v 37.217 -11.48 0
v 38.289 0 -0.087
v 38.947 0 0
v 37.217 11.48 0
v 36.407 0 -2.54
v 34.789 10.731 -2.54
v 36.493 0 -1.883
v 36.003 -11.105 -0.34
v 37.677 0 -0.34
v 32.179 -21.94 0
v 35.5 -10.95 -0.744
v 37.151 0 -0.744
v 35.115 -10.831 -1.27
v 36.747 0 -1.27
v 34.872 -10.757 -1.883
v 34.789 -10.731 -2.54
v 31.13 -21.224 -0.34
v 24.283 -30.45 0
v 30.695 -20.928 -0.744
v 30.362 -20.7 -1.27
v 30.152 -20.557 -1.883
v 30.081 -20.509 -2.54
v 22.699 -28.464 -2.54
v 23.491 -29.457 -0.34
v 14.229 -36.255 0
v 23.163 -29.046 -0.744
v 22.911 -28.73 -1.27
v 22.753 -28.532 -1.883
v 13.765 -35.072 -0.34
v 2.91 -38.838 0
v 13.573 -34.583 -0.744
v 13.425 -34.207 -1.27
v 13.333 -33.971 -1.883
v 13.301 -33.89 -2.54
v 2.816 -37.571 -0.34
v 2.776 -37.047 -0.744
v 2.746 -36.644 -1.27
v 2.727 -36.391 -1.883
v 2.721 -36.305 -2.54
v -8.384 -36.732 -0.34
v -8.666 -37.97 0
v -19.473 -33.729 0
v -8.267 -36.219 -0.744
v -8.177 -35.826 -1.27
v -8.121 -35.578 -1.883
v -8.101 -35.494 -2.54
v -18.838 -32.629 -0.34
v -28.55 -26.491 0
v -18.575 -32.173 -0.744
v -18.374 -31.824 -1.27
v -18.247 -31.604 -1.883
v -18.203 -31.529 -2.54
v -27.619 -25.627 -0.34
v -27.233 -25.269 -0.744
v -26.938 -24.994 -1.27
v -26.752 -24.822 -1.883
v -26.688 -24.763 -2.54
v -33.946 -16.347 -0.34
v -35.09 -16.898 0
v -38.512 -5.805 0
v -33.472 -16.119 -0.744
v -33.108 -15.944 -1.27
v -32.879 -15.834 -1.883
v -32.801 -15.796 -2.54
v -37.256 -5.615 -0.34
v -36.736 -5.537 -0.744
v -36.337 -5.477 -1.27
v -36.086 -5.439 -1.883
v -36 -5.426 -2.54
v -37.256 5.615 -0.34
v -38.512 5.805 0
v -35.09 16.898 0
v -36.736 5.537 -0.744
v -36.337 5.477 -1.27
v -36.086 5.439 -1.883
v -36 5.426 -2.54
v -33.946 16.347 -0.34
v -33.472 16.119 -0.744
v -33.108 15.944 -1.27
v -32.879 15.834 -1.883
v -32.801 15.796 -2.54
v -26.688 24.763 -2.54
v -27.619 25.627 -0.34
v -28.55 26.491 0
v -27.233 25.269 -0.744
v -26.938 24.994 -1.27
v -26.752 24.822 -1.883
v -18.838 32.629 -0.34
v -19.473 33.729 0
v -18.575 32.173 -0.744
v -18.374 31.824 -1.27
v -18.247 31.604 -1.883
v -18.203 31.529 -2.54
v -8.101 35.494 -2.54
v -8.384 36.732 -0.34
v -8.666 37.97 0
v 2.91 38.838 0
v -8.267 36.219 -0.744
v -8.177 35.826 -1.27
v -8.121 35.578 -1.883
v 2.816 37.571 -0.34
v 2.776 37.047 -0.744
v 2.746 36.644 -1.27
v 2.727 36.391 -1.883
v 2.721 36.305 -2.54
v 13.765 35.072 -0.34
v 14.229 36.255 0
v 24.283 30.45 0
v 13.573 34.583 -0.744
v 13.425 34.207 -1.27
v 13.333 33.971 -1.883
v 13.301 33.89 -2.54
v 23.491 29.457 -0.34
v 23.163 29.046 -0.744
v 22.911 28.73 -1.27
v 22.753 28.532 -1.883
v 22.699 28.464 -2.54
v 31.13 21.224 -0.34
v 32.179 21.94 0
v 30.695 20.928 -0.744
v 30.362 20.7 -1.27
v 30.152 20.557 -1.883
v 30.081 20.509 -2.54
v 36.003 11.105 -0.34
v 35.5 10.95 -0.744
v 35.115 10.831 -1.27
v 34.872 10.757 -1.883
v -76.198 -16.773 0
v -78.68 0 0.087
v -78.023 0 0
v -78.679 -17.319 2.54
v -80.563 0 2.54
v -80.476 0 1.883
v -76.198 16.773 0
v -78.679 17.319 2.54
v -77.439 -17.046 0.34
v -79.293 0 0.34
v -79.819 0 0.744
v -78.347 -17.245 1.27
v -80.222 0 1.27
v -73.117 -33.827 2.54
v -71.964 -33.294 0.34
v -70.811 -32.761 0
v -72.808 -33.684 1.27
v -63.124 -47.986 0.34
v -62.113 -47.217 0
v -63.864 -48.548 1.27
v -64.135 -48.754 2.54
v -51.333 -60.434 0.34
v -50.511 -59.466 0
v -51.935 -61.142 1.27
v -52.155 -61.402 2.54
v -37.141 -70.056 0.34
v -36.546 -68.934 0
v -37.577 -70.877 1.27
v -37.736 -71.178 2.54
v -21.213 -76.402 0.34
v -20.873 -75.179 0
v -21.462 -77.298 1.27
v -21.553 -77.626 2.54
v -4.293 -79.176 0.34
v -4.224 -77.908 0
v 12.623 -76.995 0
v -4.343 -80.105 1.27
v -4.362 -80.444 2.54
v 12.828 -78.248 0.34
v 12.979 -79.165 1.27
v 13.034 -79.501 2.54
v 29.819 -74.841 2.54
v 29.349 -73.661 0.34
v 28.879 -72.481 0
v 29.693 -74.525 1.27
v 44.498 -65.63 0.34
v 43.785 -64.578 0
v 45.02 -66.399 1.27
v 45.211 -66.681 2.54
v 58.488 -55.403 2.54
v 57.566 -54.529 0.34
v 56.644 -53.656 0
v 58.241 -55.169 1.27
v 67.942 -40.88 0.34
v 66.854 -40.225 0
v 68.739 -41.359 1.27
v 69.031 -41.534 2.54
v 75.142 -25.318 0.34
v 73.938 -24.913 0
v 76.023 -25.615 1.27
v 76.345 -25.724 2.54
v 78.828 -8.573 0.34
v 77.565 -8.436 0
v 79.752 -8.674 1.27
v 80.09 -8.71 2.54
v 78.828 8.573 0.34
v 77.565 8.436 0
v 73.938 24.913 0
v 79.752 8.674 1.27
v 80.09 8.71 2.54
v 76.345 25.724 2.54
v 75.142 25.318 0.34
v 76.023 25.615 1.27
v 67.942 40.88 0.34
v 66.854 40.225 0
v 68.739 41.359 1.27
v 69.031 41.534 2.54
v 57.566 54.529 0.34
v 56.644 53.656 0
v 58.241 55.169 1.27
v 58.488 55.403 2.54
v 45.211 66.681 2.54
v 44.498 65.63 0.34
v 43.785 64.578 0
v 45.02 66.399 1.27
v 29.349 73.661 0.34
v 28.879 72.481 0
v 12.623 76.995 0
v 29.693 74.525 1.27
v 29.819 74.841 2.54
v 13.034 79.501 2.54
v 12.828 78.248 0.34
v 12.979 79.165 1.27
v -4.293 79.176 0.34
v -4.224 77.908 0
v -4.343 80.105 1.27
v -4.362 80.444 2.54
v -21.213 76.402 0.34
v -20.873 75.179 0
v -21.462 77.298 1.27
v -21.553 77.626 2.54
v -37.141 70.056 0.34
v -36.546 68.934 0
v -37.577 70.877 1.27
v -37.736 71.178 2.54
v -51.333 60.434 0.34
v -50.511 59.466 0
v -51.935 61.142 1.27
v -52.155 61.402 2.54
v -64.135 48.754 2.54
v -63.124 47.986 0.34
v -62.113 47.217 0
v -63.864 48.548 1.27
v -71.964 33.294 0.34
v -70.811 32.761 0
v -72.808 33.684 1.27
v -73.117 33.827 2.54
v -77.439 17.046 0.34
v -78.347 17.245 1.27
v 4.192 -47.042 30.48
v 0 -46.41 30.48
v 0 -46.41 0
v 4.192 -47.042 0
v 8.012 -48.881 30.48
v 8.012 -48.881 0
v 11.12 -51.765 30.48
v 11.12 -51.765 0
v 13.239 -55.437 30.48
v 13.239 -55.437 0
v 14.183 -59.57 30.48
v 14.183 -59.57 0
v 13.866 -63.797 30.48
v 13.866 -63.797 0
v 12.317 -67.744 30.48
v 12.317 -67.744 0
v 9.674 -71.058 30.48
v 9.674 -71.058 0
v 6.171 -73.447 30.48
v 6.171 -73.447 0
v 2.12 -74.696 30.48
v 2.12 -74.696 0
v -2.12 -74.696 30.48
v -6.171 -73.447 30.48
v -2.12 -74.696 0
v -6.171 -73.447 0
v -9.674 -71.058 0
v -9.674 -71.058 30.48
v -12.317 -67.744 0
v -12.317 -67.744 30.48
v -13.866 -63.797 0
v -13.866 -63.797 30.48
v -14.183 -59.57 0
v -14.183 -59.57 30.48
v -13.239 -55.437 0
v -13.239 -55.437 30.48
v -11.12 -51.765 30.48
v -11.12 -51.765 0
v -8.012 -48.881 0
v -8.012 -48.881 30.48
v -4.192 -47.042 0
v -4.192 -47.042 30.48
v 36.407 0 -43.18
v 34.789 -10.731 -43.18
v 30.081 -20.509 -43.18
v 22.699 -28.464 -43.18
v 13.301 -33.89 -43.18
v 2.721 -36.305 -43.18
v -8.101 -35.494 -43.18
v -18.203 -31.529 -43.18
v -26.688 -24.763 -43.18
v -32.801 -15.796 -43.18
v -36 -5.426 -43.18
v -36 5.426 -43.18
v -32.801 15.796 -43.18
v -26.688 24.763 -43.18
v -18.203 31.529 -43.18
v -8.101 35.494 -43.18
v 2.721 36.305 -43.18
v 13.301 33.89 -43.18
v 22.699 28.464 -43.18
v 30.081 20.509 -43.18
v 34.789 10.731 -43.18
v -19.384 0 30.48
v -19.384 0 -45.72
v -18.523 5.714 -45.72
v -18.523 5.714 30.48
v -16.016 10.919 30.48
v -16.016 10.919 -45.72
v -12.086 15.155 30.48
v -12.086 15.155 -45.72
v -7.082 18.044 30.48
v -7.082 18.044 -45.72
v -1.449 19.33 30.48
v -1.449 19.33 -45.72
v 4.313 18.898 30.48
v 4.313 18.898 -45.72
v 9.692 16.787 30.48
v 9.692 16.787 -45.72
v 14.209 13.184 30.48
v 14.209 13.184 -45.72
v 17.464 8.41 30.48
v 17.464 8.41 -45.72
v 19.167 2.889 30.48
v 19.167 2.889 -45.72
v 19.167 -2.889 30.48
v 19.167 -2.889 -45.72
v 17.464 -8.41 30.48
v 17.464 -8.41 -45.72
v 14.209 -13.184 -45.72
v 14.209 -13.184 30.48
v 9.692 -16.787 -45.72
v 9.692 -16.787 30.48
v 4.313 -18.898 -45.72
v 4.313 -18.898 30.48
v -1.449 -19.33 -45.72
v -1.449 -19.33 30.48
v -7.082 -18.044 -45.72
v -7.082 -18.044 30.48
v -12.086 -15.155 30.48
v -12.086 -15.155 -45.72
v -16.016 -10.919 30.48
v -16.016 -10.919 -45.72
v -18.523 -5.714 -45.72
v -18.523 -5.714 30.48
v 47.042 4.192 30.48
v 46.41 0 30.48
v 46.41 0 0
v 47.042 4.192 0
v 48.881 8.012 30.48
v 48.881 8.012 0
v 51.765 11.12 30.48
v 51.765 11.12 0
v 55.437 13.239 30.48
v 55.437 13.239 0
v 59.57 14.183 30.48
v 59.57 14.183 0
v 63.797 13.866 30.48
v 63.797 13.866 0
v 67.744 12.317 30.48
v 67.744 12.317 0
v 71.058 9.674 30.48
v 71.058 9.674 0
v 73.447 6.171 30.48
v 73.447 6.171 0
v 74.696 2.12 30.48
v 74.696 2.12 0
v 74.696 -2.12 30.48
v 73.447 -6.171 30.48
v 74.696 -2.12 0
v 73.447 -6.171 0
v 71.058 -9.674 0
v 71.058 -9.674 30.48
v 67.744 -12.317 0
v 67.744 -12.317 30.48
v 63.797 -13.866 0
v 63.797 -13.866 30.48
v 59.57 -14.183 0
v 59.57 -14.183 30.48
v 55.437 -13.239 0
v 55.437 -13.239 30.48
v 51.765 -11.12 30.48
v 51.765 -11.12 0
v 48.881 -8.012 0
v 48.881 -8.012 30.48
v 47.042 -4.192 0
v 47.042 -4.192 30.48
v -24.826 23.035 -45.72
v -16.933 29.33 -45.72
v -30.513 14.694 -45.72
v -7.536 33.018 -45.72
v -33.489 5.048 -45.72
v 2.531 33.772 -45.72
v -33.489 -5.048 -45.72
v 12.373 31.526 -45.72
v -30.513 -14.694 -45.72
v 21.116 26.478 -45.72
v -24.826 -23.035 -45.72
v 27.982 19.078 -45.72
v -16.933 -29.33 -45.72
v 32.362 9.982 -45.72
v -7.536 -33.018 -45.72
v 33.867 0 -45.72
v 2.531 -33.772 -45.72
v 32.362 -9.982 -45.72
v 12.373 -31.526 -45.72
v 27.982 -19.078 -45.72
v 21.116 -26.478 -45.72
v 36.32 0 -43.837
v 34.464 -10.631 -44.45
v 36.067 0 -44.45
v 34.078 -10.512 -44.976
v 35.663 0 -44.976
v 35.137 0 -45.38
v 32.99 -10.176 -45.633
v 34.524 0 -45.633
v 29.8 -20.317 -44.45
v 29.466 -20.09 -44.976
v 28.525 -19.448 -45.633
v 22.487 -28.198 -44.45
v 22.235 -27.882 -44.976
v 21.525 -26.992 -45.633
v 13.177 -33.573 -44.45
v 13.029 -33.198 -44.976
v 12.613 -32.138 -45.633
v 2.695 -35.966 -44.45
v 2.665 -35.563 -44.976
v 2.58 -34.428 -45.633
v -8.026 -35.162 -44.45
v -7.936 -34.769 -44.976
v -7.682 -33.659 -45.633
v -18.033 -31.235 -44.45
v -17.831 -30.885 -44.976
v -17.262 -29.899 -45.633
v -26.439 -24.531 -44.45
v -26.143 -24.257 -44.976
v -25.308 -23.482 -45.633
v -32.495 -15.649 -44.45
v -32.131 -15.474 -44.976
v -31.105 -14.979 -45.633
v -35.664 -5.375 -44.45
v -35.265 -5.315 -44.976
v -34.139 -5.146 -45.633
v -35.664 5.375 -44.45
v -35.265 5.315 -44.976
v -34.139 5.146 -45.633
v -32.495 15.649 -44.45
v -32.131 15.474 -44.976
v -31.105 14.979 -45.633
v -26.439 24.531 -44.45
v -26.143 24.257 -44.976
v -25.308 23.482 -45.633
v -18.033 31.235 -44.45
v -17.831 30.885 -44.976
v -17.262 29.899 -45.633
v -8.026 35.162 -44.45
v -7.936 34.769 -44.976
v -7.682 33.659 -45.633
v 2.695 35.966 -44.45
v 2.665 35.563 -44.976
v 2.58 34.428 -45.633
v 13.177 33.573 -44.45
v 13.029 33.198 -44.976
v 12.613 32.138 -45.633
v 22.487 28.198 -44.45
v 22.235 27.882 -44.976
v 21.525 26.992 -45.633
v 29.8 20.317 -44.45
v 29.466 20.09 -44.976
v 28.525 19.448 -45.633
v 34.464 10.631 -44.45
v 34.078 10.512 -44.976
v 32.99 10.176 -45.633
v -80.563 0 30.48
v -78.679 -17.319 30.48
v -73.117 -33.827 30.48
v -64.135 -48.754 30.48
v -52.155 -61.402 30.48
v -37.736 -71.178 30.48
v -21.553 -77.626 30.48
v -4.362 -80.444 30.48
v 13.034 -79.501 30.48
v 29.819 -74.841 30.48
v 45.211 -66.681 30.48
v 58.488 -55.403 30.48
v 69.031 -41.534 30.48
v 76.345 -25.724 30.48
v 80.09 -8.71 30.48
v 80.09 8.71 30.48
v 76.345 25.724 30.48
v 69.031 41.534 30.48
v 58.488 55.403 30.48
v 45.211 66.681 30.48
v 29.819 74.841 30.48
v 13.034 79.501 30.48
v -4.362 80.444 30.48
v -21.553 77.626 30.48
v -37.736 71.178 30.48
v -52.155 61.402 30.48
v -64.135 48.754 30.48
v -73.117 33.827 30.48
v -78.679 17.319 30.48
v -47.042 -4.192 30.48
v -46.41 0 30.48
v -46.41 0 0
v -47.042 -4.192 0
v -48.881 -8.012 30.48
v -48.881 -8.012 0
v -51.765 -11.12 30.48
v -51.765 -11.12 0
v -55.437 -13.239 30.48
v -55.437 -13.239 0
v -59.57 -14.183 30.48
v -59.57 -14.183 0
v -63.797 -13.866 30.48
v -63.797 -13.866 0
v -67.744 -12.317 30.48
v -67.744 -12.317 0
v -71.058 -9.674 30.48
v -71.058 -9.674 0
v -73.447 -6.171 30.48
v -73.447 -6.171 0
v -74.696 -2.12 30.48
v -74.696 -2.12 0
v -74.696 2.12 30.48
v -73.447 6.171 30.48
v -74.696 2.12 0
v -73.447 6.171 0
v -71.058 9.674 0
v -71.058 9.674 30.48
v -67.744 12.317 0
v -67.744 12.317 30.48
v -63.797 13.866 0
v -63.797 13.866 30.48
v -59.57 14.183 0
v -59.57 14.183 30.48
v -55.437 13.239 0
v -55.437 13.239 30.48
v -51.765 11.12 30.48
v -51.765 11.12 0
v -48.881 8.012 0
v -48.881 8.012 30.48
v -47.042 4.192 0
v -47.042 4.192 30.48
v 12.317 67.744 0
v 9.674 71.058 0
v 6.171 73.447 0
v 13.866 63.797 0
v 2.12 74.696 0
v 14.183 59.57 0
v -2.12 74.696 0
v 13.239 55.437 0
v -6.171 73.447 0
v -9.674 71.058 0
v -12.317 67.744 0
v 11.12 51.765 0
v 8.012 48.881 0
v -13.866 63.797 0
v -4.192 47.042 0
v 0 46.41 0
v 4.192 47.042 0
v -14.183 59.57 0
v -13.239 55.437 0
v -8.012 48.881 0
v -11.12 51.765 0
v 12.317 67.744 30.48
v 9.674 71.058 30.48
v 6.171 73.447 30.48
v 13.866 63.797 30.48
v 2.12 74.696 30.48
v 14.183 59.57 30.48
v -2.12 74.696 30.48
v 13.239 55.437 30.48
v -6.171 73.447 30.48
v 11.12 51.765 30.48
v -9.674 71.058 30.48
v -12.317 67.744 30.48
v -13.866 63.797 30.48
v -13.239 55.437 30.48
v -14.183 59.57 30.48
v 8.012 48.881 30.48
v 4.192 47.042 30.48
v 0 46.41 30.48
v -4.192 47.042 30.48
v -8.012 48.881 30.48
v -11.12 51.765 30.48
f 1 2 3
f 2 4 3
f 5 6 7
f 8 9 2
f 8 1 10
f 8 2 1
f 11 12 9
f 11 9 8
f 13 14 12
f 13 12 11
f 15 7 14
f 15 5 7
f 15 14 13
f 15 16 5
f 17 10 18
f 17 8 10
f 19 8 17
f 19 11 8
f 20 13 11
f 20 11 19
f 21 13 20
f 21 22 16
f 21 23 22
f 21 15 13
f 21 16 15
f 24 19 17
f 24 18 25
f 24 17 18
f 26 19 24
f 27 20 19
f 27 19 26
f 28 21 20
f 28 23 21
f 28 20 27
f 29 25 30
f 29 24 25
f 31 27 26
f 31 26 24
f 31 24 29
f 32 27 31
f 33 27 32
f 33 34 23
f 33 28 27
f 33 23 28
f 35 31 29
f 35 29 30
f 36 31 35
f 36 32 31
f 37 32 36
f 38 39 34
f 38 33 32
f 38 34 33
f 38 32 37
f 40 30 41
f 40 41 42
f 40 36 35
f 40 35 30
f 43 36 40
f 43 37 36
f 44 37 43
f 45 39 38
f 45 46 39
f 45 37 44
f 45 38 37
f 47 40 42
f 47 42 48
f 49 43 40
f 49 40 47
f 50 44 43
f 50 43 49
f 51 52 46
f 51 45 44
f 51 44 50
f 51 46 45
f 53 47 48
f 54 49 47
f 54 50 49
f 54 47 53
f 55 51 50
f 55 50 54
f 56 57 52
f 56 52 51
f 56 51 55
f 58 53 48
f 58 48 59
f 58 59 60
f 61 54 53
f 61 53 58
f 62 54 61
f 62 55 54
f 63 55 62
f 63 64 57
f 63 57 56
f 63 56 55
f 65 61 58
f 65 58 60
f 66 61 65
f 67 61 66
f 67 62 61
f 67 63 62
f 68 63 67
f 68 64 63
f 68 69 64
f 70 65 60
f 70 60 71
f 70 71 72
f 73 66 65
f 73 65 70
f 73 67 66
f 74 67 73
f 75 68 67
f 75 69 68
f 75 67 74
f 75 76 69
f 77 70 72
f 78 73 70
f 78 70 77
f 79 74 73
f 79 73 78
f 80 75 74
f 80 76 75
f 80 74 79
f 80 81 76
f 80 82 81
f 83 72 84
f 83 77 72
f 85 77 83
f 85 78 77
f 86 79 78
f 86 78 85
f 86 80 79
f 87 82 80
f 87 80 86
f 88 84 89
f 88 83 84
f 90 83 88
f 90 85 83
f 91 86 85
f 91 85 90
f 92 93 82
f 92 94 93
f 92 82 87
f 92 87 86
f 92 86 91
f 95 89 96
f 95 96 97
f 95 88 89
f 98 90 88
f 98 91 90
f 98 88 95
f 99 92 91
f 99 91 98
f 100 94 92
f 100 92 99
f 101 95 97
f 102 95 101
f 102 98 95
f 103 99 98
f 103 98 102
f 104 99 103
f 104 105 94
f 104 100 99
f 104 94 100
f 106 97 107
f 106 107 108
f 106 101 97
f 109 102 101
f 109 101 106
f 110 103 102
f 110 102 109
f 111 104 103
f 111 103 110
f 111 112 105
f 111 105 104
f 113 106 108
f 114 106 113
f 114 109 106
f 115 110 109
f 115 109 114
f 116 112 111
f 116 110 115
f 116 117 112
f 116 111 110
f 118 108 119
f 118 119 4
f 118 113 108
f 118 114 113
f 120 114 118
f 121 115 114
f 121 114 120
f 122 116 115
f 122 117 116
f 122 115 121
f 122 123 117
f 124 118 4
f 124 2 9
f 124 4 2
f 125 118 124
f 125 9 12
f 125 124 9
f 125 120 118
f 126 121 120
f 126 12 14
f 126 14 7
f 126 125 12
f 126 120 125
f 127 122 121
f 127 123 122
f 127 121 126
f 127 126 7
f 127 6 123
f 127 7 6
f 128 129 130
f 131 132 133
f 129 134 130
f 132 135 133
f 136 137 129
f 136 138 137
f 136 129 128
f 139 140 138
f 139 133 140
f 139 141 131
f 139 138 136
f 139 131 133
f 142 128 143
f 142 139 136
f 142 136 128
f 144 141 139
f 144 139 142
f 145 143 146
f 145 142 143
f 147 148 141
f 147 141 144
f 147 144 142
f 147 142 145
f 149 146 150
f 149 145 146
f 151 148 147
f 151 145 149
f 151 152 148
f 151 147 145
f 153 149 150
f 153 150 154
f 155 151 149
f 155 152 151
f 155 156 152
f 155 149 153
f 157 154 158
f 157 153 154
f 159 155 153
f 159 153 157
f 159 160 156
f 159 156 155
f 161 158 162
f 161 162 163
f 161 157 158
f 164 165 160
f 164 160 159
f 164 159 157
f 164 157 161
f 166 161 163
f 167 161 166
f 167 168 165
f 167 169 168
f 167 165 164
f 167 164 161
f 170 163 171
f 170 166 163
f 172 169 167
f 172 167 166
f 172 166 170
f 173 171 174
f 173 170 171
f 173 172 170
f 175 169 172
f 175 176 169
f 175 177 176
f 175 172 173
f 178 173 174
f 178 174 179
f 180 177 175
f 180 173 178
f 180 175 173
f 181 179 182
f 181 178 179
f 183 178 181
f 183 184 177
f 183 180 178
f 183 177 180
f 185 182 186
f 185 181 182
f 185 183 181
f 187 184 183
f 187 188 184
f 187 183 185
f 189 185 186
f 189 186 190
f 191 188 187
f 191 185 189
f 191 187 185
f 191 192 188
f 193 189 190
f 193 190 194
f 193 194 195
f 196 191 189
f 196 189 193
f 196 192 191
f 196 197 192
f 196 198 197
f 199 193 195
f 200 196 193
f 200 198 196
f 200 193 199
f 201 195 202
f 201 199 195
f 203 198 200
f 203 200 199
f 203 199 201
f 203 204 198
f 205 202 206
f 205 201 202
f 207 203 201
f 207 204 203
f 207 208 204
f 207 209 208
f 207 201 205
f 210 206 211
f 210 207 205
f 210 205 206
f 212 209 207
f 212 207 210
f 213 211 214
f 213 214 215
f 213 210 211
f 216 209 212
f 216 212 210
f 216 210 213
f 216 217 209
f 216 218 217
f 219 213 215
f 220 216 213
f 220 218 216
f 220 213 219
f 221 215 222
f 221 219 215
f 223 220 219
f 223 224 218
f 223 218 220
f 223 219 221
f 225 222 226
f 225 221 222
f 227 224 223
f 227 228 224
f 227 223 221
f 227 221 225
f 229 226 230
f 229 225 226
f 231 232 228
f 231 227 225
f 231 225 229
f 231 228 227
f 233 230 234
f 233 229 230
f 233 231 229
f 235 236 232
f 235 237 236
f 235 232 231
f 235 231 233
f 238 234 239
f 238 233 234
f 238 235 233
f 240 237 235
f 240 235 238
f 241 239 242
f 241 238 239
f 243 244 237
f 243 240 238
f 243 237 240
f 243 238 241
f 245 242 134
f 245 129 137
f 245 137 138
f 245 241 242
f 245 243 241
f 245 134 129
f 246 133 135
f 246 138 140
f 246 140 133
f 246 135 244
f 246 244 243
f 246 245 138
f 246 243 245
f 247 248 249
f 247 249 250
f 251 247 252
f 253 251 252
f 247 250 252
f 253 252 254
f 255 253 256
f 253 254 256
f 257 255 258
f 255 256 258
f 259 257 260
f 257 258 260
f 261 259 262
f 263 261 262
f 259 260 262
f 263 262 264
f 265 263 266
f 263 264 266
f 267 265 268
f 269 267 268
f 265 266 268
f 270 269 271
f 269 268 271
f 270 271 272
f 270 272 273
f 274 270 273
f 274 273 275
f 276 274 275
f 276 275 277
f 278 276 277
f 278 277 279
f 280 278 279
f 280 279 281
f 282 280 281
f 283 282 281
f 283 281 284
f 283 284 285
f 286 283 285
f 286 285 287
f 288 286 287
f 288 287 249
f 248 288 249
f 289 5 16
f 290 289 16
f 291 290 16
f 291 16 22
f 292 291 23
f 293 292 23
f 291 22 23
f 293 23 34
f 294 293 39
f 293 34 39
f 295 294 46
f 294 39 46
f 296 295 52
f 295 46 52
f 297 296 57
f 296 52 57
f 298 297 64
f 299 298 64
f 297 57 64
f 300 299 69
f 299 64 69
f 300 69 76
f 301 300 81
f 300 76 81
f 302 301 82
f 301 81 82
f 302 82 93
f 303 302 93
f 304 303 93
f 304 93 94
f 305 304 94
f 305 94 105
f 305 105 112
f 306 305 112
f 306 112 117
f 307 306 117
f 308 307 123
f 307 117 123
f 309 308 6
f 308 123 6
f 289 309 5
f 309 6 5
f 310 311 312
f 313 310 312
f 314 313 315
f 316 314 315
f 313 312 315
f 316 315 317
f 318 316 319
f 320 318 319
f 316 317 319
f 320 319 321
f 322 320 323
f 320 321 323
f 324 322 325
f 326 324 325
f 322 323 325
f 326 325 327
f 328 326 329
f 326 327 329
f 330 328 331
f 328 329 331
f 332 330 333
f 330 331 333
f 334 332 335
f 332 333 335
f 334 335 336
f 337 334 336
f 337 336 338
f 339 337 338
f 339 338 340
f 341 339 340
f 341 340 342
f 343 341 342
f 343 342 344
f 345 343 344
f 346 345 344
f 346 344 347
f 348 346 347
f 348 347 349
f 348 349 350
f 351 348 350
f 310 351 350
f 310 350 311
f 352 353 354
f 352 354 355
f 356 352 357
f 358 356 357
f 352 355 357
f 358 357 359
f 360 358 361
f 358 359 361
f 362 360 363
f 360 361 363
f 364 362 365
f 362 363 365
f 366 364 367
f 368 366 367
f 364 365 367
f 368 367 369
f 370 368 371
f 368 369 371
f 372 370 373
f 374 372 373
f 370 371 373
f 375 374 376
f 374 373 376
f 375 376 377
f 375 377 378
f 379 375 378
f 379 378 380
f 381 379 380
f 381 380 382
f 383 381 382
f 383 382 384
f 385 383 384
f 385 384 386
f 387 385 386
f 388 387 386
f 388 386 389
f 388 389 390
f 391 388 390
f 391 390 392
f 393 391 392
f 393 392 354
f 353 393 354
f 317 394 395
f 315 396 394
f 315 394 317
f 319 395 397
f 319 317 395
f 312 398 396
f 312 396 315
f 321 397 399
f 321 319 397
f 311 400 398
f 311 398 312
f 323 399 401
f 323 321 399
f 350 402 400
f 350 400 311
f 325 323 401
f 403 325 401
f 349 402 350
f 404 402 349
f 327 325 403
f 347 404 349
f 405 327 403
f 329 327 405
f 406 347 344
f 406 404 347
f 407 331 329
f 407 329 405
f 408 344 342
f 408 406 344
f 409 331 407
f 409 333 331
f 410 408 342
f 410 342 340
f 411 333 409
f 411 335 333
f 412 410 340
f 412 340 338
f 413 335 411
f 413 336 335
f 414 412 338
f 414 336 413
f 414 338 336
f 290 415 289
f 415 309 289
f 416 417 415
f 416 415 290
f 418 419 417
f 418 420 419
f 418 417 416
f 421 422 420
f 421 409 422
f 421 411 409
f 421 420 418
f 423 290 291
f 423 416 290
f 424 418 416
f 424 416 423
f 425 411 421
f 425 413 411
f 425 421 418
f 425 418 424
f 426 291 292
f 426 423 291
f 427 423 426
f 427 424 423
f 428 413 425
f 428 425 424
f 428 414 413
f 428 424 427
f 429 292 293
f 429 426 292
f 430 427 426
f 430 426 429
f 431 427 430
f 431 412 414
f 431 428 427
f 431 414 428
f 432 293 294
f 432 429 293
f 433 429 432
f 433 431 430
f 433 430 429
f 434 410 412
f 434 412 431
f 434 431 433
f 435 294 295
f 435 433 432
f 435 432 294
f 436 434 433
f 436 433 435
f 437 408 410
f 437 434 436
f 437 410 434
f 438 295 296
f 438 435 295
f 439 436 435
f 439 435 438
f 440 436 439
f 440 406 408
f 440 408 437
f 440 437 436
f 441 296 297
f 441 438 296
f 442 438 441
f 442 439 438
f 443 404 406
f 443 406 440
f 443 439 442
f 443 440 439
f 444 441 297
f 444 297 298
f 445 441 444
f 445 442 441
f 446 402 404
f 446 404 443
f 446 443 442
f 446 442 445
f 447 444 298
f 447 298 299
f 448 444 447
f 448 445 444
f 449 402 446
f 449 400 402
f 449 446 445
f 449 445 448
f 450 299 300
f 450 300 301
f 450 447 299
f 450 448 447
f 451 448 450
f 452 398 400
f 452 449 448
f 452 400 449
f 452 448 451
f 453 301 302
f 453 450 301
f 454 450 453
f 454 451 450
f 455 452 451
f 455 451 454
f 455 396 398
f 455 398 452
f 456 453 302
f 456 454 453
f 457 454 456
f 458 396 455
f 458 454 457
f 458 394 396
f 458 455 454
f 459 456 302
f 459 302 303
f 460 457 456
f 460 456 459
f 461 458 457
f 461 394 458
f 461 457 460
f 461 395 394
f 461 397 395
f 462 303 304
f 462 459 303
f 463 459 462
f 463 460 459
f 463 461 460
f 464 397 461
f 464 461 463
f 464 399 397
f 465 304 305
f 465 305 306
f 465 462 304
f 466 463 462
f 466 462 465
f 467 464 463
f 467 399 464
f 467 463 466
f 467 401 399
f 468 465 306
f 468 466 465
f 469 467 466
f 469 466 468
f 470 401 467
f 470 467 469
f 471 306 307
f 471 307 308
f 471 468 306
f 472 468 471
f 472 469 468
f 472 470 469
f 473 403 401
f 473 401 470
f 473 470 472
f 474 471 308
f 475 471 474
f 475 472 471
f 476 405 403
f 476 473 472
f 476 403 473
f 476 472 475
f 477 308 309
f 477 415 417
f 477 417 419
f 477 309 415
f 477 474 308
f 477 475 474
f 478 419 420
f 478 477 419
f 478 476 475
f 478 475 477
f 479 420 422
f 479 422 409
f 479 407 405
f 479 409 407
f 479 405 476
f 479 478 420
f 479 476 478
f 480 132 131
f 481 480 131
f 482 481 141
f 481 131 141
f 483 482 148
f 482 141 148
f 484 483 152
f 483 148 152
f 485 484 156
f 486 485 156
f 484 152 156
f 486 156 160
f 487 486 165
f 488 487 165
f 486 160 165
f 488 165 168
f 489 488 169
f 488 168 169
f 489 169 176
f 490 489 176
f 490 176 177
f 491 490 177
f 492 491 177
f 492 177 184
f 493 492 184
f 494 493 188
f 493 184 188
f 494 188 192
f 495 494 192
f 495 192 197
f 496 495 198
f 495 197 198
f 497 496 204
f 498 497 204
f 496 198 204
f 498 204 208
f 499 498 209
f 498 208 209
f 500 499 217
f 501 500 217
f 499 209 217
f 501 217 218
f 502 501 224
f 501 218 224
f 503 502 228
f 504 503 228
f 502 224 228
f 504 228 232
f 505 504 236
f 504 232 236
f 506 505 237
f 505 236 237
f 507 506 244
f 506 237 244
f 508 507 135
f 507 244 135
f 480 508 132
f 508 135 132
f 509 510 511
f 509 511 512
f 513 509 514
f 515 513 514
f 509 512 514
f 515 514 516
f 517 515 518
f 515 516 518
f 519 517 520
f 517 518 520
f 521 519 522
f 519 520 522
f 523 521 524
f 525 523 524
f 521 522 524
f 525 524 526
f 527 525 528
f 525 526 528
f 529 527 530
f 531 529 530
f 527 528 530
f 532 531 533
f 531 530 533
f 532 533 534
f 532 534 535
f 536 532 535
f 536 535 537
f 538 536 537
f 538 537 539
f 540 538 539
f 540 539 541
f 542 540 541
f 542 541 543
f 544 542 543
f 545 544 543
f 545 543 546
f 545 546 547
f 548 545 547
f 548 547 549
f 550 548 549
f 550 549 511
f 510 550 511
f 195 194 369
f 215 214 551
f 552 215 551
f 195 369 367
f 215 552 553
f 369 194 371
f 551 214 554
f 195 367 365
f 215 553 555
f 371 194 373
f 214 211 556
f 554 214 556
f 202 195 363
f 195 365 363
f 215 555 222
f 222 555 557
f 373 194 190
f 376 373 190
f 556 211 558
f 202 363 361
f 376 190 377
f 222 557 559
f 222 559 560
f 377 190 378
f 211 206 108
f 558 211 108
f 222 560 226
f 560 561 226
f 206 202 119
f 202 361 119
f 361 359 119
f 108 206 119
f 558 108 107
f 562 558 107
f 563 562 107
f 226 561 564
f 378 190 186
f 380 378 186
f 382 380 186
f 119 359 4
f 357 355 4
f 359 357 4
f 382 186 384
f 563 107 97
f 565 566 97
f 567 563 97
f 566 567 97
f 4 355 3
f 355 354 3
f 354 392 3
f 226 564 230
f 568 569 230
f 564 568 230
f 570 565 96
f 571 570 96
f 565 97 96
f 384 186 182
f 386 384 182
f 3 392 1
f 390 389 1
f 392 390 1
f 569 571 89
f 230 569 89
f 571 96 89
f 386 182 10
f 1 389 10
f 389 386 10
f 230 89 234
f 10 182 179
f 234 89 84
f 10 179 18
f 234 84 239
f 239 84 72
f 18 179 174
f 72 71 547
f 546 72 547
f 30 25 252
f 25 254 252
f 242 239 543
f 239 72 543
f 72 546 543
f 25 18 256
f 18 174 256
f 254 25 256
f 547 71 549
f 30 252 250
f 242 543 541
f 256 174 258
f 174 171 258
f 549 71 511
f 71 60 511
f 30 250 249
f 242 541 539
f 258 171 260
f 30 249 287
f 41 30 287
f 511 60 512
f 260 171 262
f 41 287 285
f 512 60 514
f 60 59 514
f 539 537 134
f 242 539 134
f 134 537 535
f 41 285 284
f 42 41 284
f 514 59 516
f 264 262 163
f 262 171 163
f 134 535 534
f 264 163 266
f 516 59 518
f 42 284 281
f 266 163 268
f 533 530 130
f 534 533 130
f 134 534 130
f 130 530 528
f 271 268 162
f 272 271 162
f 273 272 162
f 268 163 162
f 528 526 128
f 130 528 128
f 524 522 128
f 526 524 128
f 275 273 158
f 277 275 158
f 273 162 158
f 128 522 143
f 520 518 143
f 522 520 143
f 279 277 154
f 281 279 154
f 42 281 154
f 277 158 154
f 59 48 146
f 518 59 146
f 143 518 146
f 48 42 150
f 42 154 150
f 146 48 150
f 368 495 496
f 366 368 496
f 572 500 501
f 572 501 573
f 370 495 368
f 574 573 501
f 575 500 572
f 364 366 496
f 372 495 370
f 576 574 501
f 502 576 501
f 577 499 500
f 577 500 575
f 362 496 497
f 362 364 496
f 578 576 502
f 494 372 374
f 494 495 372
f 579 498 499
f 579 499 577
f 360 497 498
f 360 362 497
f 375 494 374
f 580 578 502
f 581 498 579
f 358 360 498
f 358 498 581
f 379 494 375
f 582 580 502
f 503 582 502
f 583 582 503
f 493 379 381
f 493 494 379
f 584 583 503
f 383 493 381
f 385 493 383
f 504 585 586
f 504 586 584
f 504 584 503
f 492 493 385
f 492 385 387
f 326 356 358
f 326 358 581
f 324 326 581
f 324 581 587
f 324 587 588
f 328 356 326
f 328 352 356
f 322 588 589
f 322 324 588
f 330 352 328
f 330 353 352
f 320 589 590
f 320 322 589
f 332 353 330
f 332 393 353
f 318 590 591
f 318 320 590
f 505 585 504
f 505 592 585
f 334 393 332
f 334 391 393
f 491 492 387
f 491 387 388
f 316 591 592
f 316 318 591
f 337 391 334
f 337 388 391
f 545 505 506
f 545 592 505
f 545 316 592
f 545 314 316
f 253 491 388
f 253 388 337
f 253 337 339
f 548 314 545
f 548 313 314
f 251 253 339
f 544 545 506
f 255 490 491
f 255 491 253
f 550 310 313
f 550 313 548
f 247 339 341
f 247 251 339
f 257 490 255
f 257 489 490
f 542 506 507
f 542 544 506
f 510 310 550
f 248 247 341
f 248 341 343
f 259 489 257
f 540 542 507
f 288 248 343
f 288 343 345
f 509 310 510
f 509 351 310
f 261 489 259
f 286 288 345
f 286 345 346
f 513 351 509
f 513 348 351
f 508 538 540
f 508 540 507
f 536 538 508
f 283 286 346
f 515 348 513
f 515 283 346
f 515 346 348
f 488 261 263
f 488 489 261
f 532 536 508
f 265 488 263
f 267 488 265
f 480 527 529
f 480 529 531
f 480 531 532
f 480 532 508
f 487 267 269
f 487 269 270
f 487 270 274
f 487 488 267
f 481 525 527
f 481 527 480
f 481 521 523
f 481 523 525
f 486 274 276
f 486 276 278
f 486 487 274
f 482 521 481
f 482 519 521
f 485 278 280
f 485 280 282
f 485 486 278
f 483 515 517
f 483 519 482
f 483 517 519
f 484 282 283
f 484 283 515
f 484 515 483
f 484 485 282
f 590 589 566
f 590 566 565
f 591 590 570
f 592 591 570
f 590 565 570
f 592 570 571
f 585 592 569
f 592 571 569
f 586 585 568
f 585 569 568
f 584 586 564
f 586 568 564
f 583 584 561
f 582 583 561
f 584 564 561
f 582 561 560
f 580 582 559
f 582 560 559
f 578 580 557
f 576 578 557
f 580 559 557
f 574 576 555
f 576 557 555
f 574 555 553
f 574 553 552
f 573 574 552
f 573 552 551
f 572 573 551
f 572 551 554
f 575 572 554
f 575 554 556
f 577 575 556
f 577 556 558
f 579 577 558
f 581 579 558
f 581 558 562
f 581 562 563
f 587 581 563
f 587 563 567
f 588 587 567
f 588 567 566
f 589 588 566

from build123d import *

# Parameters (mm, degrees)
SKETCH1_R           = 80.562529646
BOSS_EXTRUDE1_DEPTH = 30.48
SKETCH3_R           = 36.406797413
BOSS_EXTRUDE2_DEPTH = 45.72
SKETCH4_R           = 19.383893348
CUT_EXTRUDE1_DEPTH  = 138.065978148
SKETCH5_R           = 14.222468522
CUT_EXTRUDE2_DEPTH  = 122.840694211
CIRPATTERN2_COUNT   = 4
FILLET1_R           = 2.54
FILLET2_R           = 2.54


with BuildPart() as part:
    # Sketch1 → Boss-Extrude1 (new body)
    with BuildSketch(Plane.XY):
        with Locations(Location((0, 0, 0), (0, 0, 180))):
            Circle(SKETCH1_R)
    extrude(amount=BOSS_EXTRUDE1_DEPTH)

    # Sketch3 → Boss-Extrude2 (add)
    with BuildSketch(Plane(origin=(0, 0, 0), x_dir=(-1, 0, 0), z_dir=(0, 0, -1))):
        with Locations(Location((0, 0, 0), (0, 0, 180))):
            Circle(SKETCH3_R)
    extrude(amount=BOSS_EXTRUDE2_DEPTH)

    # Sketch4 → Cut-Extrude1 (cut, through all)
    with BuildSketch(Plane(origin=(0, 0, -45.72), x_dir=(-1, 0, 0), z_dir=(0, 0, -1))):
        Circle(SKETCH4_R)
    extrude(amount=-CUT_EXTRUDE1_DEPTH, mode=Mode.SUBTRACT)

    # Sketch5 → Cut-Extrude2 (cut, through all)
    with BuildSketch(Plane(origin=(0, 0, -2.54), x_dir=(-1, 0, 0), z_dir=(0, 0, -1))):
        with Locations((-60.632628963, 0)):
            Circle(SKETCH5_R)
    cut_extrude2 = extrude(amount=-CUT_EXTRUDE2_DEPTH, mode=Mode.SUBTRACT)

    # CirPattern2: Cut-Extrude2 ×4 about axis
    cirpattern2_axis = Axis((0, 0, 0), (0, 0, 1))
    for i in range(1, CIRPATTERN2_COUNT):
        add(cut_extrude2.rotate(cirpattern2_axis, i * 360 / CIRPATTERN2_COUNT), mode=Mode.SUBTRACT)

    # Fillet1
    fillet1_edges = [part.edges().sort_by_distance(p)[0] for p in [
        (-36.406797413, 0, 0),
        (-36.406797413, 0, -45.72),
    ]]
    fillet(fillet1_edges, radius=FILLET1_R)

    # Fillet2
    fillet2_edges = [part.edges().sort_by_distance(p)[0] for p in [
        (80.562529646, 0, 0),
    ]]
    fillet(fillet2_edges, radius=FILLET2_R)


solid = part.part
